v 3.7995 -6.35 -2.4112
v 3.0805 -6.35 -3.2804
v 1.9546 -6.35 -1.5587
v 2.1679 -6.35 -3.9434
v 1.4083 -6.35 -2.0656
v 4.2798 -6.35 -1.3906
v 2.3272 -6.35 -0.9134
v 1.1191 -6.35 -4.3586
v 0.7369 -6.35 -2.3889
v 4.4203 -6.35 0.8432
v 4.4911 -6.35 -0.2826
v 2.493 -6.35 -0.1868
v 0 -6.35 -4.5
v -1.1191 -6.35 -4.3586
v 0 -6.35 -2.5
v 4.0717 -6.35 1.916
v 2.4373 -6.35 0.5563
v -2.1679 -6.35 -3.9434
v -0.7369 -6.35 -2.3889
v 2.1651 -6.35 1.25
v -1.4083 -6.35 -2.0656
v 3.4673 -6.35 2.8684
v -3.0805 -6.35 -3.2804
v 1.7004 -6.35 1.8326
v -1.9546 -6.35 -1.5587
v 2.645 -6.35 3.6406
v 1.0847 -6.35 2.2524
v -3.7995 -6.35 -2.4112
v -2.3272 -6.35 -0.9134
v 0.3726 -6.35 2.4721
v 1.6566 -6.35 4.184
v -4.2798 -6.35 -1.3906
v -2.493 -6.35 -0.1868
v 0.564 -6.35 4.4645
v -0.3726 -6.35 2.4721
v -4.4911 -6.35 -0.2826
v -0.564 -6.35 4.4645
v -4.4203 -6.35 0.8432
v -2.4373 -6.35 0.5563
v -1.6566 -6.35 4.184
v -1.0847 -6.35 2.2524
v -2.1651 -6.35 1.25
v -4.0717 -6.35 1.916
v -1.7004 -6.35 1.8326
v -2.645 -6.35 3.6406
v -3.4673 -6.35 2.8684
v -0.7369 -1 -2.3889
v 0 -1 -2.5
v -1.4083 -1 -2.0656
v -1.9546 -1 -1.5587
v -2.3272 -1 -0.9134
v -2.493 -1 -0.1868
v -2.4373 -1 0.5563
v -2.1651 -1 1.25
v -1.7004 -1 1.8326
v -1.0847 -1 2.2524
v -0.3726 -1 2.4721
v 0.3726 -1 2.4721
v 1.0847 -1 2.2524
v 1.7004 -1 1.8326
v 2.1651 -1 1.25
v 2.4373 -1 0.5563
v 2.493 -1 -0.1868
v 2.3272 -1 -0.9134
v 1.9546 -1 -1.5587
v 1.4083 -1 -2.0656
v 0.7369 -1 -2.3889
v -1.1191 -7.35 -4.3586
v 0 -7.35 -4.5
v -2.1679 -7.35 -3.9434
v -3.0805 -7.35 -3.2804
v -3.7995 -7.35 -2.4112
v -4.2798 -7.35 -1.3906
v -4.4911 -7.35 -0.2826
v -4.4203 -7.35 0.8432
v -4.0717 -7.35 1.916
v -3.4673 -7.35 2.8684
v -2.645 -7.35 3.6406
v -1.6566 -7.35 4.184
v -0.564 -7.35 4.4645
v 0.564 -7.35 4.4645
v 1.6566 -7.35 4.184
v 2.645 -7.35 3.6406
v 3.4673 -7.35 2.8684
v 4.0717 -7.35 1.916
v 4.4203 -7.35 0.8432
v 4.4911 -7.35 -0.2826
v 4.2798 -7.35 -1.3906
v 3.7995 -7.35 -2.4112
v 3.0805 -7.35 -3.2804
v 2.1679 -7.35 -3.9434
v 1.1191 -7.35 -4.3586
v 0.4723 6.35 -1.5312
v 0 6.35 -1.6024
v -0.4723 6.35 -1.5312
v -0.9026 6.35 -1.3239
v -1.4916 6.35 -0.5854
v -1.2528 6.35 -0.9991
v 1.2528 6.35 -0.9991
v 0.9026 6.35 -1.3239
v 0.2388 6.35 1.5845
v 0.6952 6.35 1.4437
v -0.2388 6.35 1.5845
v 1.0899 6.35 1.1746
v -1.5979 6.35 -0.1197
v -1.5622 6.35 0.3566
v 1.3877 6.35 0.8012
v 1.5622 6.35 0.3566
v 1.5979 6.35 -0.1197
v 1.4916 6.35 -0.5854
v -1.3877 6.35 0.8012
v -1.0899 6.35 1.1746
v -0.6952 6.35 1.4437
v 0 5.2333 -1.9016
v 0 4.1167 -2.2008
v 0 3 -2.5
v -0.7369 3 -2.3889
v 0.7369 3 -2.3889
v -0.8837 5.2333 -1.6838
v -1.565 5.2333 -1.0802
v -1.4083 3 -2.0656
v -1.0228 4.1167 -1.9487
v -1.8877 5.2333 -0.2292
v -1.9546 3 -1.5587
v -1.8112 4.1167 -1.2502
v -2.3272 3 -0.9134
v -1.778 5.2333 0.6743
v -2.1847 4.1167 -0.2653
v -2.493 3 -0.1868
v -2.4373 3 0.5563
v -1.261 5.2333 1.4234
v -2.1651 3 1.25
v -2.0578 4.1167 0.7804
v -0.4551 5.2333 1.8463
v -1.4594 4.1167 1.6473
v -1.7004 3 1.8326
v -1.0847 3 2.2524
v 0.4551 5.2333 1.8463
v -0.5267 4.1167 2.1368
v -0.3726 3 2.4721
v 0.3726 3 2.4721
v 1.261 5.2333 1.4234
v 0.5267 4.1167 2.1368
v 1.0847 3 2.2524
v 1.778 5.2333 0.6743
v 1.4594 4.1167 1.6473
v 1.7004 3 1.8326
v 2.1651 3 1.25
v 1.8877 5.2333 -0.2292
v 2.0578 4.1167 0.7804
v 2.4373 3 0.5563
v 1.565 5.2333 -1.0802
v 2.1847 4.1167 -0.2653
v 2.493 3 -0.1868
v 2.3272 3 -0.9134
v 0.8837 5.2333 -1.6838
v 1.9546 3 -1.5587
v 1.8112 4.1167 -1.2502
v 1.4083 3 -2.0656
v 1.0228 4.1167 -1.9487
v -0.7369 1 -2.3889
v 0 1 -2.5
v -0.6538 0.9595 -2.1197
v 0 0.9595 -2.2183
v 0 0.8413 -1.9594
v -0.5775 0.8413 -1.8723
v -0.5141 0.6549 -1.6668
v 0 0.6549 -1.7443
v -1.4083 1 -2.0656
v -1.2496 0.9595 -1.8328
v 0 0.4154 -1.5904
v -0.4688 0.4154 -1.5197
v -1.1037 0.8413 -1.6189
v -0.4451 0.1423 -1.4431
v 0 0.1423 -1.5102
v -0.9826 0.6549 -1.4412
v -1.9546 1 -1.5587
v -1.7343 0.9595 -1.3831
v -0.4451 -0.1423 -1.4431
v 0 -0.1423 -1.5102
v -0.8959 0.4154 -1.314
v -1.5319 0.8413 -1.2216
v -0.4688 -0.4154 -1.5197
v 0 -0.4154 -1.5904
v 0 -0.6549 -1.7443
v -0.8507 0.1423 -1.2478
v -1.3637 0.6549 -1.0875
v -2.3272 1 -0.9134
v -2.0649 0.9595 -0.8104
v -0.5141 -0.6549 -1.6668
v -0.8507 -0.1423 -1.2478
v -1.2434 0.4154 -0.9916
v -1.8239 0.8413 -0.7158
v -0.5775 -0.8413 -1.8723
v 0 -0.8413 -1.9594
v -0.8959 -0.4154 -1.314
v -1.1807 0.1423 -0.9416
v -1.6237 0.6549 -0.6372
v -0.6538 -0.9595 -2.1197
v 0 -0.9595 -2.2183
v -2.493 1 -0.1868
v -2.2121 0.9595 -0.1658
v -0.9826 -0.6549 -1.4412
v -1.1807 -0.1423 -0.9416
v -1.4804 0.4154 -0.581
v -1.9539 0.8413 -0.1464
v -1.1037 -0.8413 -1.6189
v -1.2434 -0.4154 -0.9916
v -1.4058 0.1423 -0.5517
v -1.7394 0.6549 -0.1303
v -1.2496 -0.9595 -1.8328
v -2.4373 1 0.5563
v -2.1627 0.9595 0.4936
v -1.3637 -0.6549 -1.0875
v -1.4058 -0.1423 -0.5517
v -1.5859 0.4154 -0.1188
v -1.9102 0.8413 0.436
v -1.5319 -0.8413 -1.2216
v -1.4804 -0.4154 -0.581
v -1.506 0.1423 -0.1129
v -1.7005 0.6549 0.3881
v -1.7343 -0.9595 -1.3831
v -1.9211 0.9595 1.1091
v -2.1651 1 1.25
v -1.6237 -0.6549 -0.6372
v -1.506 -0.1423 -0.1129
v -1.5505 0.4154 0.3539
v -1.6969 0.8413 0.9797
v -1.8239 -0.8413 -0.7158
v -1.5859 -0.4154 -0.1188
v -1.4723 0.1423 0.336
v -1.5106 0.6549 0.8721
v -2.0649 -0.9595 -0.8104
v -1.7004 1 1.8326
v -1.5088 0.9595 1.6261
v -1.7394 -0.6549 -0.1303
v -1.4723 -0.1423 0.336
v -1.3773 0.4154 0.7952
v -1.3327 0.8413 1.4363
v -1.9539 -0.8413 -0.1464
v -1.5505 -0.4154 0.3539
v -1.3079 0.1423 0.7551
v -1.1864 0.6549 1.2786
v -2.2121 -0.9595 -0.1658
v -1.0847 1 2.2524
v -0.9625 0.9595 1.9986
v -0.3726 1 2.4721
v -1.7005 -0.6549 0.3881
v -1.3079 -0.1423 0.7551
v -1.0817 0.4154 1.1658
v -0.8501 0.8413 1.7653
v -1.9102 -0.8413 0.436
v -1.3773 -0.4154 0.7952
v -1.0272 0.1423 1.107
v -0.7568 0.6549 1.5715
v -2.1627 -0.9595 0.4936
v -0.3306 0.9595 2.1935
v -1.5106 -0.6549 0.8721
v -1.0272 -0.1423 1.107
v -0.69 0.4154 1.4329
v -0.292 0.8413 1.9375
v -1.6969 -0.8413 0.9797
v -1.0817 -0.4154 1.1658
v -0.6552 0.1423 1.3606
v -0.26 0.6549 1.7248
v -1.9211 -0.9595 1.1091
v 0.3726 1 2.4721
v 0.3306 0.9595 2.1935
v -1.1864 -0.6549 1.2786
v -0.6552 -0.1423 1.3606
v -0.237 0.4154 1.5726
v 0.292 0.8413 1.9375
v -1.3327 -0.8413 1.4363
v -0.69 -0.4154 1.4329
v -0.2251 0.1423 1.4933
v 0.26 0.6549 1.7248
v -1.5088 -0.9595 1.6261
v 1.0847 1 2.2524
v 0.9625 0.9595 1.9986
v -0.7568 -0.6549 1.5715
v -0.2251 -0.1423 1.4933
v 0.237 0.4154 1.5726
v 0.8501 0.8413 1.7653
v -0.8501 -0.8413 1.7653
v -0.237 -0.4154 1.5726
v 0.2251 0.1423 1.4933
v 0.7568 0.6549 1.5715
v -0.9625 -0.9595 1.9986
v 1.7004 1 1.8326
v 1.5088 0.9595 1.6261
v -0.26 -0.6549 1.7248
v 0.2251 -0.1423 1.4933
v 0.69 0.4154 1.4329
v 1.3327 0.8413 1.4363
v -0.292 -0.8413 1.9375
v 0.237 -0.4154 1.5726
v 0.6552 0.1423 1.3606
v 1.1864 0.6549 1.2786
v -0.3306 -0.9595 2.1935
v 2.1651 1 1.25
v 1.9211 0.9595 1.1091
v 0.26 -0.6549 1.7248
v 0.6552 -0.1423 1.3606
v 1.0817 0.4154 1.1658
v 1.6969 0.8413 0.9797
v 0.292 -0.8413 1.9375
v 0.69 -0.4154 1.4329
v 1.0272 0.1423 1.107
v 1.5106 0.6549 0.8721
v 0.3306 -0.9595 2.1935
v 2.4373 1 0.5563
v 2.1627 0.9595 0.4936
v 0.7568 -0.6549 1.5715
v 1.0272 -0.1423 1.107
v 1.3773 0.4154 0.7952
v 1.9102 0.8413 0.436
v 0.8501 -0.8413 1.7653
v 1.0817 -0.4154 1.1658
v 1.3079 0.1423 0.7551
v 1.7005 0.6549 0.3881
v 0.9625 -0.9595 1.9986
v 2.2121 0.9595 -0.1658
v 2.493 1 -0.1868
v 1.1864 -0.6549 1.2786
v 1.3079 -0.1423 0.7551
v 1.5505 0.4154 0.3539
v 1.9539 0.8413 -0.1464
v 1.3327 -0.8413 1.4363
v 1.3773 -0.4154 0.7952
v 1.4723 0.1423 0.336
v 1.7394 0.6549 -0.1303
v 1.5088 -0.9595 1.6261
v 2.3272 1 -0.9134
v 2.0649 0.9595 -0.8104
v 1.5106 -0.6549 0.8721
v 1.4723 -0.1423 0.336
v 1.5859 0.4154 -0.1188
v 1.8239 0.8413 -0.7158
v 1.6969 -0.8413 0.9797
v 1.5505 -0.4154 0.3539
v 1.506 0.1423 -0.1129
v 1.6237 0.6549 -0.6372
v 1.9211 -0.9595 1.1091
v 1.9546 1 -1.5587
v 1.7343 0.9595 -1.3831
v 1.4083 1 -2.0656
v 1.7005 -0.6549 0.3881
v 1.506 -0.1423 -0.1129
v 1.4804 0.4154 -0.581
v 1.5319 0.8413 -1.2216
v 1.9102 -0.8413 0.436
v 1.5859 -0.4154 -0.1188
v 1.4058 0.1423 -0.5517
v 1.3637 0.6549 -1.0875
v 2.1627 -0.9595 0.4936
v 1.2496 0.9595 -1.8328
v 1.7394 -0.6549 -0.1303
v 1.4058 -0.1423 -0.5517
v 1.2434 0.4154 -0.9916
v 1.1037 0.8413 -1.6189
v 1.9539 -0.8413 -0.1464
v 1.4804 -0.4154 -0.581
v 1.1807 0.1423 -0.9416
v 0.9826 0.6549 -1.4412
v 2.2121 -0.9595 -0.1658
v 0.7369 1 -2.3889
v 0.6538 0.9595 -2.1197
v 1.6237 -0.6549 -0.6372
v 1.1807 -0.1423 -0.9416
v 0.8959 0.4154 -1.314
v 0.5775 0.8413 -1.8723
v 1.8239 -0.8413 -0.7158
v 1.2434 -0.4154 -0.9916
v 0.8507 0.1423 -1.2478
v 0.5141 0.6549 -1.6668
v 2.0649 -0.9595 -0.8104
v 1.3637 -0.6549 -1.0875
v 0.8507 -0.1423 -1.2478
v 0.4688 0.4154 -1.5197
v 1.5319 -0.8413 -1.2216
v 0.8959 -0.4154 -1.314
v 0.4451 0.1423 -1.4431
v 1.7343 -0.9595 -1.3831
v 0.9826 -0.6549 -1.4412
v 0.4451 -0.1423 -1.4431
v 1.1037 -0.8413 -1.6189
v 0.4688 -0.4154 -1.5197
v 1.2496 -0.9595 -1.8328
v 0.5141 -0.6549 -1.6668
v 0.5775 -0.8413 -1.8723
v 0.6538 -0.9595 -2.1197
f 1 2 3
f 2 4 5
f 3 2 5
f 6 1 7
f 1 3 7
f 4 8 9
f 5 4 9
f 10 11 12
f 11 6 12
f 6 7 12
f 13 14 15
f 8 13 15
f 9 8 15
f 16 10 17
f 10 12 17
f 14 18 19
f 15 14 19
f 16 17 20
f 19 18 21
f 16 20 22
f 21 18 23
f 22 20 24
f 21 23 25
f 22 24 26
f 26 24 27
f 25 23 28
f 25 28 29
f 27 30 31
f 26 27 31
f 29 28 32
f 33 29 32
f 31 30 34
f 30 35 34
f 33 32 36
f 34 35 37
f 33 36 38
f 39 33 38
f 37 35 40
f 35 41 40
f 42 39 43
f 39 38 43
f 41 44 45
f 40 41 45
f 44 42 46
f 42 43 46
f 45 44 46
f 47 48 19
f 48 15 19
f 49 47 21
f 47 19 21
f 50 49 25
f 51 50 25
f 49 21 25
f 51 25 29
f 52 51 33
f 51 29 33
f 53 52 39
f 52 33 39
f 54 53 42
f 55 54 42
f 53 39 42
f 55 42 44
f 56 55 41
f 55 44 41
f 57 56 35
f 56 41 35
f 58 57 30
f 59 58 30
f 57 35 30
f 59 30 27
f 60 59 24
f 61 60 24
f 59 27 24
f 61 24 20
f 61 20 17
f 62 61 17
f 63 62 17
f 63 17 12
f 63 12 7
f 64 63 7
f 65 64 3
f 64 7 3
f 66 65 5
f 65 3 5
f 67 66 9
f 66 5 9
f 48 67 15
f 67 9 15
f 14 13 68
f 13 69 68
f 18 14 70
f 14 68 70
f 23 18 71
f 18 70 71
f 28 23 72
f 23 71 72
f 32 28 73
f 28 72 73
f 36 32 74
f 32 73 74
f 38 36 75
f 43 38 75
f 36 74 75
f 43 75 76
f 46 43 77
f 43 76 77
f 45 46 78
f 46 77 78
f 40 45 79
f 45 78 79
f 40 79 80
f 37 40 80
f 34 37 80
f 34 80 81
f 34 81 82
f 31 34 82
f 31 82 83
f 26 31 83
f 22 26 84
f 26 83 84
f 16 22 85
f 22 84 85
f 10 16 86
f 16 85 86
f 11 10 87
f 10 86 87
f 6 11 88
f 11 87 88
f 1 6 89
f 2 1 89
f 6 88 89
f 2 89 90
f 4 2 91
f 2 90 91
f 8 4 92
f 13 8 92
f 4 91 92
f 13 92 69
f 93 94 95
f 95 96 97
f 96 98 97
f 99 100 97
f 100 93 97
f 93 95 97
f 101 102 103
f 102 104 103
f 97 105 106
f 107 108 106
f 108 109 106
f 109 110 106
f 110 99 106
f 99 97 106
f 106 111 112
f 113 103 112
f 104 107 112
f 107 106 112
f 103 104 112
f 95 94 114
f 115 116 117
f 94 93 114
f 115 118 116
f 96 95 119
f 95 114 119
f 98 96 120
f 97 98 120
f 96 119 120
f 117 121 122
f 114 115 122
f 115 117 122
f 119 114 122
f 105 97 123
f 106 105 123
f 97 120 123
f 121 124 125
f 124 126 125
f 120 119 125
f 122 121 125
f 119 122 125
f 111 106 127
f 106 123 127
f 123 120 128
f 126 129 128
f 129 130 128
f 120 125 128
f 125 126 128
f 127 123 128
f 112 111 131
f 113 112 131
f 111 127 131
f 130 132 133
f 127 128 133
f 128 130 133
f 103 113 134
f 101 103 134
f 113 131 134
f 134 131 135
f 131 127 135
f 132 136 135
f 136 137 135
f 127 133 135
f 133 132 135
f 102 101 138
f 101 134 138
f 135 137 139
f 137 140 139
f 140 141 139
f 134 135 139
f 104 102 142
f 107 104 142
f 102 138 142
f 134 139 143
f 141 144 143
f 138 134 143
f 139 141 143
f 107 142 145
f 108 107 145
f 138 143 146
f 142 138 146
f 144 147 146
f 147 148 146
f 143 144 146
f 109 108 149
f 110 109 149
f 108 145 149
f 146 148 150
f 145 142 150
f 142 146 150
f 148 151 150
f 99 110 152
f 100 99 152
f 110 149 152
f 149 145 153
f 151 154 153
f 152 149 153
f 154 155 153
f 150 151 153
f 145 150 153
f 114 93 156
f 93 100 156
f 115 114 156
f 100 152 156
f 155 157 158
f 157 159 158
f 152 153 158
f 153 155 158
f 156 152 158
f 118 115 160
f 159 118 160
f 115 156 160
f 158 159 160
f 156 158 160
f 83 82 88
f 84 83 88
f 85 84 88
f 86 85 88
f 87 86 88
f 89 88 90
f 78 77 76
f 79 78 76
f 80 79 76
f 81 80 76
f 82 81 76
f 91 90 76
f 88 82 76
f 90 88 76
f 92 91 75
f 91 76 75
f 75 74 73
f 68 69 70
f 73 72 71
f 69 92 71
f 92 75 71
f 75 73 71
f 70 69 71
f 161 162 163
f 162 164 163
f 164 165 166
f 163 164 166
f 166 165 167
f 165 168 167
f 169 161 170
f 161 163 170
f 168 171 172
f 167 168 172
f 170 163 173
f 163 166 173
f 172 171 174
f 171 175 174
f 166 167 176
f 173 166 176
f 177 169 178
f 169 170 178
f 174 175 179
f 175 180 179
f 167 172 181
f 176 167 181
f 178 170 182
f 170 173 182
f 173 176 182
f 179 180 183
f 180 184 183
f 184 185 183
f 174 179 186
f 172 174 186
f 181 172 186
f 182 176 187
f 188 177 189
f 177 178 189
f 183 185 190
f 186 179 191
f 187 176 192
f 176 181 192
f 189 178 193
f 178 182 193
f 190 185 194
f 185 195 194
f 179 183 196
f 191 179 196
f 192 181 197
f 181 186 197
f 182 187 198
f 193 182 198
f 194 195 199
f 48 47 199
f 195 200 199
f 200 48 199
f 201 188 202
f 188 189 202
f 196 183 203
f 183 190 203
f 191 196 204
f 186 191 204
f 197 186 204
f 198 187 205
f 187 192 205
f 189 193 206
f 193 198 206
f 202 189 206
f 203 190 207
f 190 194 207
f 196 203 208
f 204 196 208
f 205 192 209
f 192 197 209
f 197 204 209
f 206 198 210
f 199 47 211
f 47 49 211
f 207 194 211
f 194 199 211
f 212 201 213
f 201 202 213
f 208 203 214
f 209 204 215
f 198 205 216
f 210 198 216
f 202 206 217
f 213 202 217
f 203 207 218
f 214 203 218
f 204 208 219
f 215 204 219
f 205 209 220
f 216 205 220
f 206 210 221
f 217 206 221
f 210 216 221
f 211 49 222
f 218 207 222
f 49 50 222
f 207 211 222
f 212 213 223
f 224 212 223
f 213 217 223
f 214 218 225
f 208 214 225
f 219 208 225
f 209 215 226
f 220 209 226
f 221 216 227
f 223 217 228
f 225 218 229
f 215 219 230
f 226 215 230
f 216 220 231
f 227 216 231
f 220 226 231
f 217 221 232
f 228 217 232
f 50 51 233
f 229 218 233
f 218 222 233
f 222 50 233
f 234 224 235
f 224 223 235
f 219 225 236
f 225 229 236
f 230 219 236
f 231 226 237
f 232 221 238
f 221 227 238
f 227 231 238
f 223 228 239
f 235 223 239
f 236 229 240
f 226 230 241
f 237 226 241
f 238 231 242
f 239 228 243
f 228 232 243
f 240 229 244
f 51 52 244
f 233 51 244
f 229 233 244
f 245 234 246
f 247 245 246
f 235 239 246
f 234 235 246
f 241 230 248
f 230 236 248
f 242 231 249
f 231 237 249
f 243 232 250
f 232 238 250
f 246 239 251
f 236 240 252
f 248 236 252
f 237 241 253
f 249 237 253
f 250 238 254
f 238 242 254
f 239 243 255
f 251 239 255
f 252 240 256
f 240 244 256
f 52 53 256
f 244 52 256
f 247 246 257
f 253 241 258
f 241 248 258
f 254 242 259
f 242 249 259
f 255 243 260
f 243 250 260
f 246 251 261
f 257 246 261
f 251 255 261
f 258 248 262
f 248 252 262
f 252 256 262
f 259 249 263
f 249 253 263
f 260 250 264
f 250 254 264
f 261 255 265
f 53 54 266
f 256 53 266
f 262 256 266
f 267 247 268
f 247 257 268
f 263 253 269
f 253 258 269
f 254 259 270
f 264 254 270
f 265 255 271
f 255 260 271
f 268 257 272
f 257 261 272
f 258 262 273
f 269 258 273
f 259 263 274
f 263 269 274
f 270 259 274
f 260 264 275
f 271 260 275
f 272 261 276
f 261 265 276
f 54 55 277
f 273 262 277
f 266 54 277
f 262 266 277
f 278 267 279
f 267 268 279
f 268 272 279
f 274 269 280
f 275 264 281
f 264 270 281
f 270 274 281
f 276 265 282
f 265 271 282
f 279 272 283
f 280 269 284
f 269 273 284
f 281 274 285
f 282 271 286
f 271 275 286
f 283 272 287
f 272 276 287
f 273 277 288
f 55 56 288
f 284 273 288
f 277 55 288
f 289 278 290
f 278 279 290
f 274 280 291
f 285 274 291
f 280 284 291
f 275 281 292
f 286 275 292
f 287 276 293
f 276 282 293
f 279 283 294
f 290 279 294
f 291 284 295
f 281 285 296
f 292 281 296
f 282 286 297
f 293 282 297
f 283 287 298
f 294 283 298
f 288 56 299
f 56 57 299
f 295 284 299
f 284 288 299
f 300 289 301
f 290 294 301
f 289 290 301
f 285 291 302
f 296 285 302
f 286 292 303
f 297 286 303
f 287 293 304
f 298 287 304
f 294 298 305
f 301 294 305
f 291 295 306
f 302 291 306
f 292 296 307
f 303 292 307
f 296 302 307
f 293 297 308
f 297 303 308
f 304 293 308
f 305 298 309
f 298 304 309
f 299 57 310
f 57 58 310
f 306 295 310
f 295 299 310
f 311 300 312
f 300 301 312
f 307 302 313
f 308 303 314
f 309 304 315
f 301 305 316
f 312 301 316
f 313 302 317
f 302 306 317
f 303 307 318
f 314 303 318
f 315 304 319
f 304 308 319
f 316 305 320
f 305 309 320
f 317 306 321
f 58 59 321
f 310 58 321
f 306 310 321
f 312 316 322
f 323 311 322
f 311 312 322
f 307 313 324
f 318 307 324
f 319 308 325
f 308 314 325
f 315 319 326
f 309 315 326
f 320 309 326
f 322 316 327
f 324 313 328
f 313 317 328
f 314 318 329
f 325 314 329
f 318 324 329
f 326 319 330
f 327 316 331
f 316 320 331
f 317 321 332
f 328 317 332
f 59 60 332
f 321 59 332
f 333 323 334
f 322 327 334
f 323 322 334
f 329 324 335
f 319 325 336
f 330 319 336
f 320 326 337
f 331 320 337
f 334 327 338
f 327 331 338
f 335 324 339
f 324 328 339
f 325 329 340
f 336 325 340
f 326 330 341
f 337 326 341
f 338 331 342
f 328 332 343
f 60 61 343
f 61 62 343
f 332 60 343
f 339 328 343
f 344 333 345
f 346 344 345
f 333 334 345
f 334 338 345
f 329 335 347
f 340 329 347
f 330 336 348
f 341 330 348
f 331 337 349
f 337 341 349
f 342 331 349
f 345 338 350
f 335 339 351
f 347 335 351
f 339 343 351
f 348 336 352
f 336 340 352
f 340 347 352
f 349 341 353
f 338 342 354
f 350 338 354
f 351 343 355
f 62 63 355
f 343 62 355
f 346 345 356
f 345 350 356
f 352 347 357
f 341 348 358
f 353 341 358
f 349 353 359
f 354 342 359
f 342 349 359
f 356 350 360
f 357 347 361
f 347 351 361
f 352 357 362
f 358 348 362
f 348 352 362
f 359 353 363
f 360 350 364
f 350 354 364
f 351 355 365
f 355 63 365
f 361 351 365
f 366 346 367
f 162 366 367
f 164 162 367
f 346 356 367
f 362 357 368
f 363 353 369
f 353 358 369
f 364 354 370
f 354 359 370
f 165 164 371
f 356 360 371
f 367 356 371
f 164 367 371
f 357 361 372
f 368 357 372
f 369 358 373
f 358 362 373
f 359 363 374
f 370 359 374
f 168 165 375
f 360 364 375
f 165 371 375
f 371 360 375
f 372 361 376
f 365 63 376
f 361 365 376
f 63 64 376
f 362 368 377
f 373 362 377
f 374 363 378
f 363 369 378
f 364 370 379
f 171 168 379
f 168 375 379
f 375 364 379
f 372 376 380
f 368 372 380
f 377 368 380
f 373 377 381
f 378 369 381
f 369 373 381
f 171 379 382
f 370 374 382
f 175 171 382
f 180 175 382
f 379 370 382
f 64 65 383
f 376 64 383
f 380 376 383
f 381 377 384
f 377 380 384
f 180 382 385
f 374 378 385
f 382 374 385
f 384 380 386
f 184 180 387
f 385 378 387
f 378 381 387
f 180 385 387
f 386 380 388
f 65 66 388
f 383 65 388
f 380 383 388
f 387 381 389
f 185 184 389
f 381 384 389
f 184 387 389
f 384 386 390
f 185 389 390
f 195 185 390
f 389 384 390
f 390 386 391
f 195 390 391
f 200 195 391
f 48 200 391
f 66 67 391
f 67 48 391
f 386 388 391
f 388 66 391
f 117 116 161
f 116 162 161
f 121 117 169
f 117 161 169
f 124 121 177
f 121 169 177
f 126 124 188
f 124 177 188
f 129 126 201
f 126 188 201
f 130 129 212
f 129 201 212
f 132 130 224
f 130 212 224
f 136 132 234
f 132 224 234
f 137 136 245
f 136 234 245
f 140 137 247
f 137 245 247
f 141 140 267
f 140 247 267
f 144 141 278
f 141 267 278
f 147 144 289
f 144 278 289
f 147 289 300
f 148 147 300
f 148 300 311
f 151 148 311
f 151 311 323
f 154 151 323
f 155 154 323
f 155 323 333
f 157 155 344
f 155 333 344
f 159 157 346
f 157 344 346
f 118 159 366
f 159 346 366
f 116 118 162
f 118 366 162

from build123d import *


with BuildPart() as part:
    # Sketch1 → Revolve1 (revolve)
    with BuildSketch(Plane.XY, mode=Mode.PRIVATE) as revolve1_sk:
        with BuildLine():
            Line((0, 6.35), (-1.602370205, 6.35))
            Line((-1.602370205, 6.35), (-2.5, 3))
            Line((-2.5, 3), (-2.5, 1))
            ThreePointArc((-2.5, 1), (-1.5, 0), (-2.5, -1))
            Line((-2.5, -1), (-2.5, -6.35))
            Line((-2.5, -6.35), (-4.5, -6.35))
            Line((-4.5, -6.35), (-4.5, -7.35))
            Line((-4.5, -7.35), (0, -7.35))
            Line((0, -7.35), (0, 6.35))
        make_face()
    revolve(revolve1_sk.sketch.rotate(Axis((0, 0, 0), (0, 1, 0)), 270), axis=Axis((0, 0, 0), (0, 1, 0)))


solid = part.part
